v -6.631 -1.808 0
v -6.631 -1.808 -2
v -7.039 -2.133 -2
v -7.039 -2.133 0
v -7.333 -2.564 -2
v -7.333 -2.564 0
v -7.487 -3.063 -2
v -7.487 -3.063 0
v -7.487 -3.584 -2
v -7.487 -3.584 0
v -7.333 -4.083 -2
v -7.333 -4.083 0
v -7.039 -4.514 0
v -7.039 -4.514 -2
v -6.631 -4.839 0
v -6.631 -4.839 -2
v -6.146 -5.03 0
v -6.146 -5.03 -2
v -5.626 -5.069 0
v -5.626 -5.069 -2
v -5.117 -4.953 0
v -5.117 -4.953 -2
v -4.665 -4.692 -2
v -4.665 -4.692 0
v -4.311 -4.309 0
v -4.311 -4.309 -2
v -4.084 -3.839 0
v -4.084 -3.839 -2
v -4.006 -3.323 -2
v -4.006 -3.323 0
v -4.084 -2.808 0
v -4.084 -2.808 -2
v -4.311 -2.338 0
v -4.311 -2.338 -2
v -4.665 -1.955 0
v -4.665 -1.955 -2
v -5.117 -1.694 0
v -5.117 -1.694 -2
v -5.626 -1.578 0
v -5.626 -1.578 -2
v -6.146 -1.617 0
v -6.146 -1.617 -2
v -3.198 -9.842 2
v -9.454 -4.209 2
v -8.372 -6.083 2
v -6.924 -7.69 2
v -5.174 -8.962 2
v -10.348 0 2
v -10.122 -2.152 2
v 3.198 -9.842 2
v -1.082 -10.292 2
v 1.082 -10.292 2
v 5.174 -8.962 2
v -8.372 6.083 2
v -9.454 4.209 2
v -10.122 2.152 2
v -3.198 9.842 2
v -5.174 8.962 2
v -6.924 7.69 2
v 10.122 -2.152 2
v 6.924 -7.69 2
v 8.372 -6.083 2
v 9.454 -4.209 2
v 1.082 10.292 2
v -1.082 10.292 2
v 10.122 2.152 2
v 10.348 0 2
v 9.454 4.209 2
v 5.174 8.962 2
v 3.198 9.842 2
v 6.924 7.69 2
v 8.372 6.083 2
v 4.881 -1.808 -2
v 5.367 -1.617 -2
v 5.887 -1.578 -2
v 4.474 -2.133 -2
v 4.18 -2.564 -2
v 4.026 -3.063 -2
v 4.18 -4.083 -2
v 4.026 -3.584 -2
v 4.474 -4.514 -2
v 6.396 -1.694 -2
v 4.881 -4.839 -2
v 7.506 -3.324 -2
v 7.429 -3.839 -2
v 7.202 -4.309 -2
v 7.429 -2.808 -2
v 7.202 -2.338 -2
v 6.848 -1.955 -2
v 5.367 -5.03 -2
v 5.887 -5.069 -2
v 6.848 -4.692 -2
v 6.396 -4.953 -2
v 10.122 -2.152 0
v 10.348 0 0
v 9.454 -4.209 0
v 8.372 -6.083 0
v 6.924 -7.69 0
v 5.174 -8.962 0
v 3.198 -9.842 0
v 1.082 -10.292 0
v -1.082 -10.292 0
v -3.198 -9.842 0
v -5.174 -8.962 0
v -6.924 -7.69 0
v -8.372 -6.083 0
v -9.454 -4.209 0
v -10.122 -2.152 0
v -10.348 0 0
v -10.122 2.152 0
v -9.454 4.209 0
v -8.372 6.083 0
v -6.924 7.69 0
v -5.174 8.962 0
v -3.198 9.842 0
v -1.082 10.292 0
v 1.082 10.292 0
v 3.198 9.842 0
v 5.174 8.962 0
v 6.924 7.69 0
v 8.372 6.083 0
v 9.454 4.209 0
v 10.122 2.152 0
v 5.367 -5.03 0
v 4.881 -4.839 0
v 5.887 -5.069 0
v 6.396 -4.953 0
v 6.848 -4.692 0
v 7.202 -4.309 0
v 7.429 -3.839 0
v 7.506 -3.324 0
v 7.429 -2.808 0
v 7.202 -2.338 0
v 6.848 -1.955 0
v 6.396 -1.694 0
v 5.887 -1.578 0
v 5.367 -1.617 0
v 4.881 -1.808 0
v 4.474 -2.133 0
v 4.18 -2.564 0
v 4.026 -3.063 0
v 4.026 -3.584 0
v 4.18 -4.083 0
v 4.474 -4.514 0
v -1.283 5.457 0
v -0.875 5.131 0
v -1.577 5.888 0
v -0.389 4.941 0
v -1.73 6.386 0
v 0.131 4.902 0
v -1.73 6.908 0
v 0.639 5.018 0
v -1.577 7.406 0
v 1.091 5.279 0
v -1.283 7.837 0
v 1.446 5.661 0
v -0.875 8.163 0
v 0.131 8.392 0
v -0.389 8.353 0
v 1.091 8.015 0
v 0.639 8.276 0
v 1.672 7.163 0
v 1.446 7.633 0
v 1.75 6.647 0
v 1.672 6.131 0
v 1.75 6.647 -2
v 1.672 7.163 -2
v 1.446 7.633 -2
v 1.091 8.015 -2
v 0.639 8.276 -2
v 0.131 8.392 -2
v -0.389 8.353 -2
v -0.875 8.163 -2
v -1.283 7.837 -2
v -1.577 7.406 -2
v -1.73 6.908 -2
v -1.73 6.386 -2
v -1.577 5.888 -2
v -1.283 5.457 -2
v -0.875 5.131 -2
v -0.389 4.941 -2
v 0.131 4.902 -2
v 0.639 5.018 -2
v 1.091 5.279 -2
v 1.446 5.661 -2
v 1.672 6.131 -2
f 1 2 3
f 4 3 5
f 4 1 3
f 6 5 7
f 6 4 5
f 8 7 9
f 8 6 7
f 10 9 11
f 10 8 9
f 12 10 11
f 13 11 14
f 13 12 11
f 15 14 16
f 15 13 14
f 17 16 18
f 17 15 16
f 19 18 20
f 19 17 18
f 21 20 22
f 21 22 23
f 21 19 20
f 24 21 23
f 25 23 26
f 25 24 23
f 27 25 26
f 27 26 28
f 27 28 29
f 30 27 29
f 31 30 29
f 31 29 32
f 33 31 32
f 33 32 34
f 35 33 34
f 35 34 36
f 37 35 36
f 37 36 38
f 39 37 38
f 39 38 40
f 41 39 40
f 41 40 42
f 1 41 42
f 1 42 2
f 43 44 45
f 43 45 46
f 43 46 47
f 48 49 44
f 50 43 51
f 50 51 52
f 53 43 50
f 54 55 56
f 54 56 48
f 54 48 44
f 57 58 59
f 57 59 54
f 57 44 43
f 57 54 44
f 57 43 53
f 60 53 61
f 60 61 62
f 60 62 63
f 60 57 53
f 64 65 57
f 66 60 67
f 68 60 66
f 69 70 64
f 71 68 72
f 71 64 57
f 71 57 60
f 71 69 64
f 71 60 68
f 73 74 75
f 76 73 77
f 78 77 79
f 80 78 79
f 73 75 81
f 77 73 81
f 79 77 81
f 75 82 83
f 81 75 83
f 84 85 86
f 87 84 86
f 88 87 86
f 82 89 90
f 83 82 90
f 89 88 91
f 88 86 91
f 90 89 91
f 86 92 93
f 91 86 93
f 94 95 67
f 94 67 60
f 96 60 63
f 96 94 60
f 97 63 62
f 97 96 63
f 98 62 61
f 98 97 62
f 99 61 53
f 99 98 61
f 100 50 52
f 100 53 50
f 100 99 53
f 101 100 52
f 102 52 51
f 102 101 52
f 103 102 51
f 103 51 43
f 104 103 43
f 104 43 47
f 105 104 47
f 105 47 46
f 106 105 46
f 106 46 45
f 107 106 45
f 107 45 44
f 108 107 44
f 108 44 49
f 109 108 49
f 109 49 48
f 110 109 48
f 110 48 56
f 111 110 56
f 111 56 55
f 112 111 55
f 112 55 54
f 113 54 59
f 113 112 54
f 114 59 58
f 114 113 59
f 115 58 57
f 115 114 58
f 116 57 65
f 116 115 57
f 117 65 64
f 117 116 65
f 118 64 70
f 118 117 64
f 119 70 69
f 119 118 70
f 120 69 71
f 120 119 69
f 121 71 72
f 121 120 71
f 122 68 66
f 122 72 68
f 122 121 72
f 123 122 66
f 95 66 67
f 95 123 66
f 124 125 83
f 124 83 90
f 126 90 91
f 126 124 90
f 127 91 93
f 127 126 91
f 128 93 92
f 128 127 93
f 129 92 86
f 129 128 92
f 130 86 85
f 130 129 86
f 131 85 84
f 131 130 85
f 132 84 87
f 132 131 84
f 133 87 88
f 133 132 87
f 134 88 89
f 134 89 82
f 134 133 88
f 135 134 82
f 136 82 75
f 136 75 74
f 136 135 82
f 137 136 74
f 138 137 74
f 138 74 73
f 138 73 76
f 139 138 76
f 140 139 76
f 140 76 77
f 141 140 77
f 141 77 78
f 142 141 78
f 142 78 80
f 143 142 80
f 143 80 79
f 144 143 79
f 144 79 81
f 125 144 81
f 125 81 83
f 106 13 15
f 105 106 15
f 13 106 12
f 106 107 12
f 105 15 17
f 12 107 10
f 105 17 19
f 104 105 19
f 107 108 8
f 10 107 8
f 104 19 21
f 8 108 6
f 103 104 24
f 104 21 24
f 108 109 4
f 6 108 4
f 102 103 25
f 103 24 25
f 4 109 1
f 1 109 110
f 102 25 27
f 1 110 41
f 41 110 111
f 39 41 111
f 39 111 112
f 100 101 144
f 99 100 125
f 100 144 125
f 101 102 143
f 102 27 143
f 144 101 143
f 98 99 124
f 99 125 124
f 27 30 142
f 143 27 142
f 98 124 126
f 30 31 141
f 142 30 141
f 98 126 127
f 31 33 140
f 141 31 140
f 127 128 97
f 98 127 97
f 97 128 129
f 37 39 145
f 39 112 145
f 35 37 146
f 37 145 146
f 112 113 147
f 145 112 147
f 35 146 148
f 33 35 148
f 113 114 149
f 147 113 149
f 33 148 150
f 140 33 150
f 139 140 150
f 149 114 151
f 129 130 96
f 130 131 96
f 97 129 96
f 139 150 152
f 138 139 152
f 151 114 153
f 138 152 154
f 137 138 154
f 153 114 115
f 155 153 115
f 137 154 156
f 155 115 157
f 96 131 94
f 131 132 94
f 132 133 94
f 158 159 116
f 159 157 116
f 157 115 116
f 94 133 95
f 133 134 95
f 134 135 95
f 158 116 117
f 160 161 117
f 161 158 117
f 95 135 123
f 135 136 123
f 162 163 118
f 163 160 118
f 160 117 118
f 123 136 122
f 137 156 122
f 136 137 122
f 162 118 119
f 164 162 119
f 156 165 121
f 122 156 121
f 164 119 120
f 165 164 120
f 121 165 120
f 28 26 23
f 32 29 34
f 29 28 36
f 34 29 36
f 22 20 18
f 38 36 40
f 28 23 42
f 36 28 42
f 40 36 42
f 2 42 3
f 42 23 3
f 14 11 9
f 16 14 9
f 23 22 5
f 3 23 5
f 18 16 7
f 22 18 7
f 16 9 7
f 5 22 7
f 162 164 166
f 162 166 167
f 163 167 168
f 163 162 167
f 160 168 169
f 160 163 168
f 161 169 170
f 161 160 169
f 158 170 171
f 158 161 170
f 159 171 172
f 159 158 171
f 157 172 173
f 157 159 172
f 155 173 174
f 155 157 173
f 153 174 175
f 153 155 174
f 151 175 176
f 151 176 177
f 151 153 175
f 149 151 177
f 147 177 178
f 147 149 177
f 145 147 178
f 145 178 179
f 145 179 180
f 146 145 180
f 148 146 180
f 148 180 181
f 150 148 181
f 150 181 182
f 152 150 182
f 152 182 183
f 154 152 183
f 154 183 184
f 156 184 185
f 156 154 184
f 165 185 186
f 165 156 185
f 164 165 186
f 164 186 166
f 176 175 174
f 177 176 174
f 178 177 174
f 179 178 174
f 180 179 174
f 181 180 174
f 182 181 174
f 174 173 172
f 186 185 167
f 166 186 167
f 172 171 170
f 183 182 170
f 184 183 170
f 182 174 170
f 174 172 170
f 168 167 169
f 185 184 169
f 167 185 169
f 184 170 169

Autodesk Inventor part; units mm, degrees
ref_plane "YZ Plane" through (0, 0, 0) normal (1, 0, 0) x (0, 1, 0)
ref_plane "XZ Plane" through (0, 0, 0) normal (0, 1, 0) x (-1, 0, 0)
ref_plane "XY Plane" through (0, 0, 0) normal (0, 0, 1) x (1, 0, 0)
sketch "Sketch1" plane through (0, 0, 0) normal (0, 0, 1) x (1, 0, 0)
  circle A0 centre (0, 6.647) radius 1.75
  point P0 (0, 0)
  dimension "d0" = 3.5
  dimension "d1" = 6.647
extrude "Extrusion1" add sketch "Sketch1" against normal blind 2
pattern_circular "Circular Pattern1" count 3 over 360 about axis through (0, 0, -10) along (0, 0, 1) of "Extrusion1"
sketch "Sketch3" plane through (-5.7565, -3.3235, 0) normal (0, 0, 1) x (1, 0, 0)
  circle A0 centre (5.7565, 3.3235) radius 10.3482
  circle A1 centre (5.7565, 3.3235) radius 11.0482 projected
  dimension "d13" = 0.7
extrude "Extrusion3" add sketch "Sketch3" along normal blind 2 contours A0
properties part number "PSteg"
